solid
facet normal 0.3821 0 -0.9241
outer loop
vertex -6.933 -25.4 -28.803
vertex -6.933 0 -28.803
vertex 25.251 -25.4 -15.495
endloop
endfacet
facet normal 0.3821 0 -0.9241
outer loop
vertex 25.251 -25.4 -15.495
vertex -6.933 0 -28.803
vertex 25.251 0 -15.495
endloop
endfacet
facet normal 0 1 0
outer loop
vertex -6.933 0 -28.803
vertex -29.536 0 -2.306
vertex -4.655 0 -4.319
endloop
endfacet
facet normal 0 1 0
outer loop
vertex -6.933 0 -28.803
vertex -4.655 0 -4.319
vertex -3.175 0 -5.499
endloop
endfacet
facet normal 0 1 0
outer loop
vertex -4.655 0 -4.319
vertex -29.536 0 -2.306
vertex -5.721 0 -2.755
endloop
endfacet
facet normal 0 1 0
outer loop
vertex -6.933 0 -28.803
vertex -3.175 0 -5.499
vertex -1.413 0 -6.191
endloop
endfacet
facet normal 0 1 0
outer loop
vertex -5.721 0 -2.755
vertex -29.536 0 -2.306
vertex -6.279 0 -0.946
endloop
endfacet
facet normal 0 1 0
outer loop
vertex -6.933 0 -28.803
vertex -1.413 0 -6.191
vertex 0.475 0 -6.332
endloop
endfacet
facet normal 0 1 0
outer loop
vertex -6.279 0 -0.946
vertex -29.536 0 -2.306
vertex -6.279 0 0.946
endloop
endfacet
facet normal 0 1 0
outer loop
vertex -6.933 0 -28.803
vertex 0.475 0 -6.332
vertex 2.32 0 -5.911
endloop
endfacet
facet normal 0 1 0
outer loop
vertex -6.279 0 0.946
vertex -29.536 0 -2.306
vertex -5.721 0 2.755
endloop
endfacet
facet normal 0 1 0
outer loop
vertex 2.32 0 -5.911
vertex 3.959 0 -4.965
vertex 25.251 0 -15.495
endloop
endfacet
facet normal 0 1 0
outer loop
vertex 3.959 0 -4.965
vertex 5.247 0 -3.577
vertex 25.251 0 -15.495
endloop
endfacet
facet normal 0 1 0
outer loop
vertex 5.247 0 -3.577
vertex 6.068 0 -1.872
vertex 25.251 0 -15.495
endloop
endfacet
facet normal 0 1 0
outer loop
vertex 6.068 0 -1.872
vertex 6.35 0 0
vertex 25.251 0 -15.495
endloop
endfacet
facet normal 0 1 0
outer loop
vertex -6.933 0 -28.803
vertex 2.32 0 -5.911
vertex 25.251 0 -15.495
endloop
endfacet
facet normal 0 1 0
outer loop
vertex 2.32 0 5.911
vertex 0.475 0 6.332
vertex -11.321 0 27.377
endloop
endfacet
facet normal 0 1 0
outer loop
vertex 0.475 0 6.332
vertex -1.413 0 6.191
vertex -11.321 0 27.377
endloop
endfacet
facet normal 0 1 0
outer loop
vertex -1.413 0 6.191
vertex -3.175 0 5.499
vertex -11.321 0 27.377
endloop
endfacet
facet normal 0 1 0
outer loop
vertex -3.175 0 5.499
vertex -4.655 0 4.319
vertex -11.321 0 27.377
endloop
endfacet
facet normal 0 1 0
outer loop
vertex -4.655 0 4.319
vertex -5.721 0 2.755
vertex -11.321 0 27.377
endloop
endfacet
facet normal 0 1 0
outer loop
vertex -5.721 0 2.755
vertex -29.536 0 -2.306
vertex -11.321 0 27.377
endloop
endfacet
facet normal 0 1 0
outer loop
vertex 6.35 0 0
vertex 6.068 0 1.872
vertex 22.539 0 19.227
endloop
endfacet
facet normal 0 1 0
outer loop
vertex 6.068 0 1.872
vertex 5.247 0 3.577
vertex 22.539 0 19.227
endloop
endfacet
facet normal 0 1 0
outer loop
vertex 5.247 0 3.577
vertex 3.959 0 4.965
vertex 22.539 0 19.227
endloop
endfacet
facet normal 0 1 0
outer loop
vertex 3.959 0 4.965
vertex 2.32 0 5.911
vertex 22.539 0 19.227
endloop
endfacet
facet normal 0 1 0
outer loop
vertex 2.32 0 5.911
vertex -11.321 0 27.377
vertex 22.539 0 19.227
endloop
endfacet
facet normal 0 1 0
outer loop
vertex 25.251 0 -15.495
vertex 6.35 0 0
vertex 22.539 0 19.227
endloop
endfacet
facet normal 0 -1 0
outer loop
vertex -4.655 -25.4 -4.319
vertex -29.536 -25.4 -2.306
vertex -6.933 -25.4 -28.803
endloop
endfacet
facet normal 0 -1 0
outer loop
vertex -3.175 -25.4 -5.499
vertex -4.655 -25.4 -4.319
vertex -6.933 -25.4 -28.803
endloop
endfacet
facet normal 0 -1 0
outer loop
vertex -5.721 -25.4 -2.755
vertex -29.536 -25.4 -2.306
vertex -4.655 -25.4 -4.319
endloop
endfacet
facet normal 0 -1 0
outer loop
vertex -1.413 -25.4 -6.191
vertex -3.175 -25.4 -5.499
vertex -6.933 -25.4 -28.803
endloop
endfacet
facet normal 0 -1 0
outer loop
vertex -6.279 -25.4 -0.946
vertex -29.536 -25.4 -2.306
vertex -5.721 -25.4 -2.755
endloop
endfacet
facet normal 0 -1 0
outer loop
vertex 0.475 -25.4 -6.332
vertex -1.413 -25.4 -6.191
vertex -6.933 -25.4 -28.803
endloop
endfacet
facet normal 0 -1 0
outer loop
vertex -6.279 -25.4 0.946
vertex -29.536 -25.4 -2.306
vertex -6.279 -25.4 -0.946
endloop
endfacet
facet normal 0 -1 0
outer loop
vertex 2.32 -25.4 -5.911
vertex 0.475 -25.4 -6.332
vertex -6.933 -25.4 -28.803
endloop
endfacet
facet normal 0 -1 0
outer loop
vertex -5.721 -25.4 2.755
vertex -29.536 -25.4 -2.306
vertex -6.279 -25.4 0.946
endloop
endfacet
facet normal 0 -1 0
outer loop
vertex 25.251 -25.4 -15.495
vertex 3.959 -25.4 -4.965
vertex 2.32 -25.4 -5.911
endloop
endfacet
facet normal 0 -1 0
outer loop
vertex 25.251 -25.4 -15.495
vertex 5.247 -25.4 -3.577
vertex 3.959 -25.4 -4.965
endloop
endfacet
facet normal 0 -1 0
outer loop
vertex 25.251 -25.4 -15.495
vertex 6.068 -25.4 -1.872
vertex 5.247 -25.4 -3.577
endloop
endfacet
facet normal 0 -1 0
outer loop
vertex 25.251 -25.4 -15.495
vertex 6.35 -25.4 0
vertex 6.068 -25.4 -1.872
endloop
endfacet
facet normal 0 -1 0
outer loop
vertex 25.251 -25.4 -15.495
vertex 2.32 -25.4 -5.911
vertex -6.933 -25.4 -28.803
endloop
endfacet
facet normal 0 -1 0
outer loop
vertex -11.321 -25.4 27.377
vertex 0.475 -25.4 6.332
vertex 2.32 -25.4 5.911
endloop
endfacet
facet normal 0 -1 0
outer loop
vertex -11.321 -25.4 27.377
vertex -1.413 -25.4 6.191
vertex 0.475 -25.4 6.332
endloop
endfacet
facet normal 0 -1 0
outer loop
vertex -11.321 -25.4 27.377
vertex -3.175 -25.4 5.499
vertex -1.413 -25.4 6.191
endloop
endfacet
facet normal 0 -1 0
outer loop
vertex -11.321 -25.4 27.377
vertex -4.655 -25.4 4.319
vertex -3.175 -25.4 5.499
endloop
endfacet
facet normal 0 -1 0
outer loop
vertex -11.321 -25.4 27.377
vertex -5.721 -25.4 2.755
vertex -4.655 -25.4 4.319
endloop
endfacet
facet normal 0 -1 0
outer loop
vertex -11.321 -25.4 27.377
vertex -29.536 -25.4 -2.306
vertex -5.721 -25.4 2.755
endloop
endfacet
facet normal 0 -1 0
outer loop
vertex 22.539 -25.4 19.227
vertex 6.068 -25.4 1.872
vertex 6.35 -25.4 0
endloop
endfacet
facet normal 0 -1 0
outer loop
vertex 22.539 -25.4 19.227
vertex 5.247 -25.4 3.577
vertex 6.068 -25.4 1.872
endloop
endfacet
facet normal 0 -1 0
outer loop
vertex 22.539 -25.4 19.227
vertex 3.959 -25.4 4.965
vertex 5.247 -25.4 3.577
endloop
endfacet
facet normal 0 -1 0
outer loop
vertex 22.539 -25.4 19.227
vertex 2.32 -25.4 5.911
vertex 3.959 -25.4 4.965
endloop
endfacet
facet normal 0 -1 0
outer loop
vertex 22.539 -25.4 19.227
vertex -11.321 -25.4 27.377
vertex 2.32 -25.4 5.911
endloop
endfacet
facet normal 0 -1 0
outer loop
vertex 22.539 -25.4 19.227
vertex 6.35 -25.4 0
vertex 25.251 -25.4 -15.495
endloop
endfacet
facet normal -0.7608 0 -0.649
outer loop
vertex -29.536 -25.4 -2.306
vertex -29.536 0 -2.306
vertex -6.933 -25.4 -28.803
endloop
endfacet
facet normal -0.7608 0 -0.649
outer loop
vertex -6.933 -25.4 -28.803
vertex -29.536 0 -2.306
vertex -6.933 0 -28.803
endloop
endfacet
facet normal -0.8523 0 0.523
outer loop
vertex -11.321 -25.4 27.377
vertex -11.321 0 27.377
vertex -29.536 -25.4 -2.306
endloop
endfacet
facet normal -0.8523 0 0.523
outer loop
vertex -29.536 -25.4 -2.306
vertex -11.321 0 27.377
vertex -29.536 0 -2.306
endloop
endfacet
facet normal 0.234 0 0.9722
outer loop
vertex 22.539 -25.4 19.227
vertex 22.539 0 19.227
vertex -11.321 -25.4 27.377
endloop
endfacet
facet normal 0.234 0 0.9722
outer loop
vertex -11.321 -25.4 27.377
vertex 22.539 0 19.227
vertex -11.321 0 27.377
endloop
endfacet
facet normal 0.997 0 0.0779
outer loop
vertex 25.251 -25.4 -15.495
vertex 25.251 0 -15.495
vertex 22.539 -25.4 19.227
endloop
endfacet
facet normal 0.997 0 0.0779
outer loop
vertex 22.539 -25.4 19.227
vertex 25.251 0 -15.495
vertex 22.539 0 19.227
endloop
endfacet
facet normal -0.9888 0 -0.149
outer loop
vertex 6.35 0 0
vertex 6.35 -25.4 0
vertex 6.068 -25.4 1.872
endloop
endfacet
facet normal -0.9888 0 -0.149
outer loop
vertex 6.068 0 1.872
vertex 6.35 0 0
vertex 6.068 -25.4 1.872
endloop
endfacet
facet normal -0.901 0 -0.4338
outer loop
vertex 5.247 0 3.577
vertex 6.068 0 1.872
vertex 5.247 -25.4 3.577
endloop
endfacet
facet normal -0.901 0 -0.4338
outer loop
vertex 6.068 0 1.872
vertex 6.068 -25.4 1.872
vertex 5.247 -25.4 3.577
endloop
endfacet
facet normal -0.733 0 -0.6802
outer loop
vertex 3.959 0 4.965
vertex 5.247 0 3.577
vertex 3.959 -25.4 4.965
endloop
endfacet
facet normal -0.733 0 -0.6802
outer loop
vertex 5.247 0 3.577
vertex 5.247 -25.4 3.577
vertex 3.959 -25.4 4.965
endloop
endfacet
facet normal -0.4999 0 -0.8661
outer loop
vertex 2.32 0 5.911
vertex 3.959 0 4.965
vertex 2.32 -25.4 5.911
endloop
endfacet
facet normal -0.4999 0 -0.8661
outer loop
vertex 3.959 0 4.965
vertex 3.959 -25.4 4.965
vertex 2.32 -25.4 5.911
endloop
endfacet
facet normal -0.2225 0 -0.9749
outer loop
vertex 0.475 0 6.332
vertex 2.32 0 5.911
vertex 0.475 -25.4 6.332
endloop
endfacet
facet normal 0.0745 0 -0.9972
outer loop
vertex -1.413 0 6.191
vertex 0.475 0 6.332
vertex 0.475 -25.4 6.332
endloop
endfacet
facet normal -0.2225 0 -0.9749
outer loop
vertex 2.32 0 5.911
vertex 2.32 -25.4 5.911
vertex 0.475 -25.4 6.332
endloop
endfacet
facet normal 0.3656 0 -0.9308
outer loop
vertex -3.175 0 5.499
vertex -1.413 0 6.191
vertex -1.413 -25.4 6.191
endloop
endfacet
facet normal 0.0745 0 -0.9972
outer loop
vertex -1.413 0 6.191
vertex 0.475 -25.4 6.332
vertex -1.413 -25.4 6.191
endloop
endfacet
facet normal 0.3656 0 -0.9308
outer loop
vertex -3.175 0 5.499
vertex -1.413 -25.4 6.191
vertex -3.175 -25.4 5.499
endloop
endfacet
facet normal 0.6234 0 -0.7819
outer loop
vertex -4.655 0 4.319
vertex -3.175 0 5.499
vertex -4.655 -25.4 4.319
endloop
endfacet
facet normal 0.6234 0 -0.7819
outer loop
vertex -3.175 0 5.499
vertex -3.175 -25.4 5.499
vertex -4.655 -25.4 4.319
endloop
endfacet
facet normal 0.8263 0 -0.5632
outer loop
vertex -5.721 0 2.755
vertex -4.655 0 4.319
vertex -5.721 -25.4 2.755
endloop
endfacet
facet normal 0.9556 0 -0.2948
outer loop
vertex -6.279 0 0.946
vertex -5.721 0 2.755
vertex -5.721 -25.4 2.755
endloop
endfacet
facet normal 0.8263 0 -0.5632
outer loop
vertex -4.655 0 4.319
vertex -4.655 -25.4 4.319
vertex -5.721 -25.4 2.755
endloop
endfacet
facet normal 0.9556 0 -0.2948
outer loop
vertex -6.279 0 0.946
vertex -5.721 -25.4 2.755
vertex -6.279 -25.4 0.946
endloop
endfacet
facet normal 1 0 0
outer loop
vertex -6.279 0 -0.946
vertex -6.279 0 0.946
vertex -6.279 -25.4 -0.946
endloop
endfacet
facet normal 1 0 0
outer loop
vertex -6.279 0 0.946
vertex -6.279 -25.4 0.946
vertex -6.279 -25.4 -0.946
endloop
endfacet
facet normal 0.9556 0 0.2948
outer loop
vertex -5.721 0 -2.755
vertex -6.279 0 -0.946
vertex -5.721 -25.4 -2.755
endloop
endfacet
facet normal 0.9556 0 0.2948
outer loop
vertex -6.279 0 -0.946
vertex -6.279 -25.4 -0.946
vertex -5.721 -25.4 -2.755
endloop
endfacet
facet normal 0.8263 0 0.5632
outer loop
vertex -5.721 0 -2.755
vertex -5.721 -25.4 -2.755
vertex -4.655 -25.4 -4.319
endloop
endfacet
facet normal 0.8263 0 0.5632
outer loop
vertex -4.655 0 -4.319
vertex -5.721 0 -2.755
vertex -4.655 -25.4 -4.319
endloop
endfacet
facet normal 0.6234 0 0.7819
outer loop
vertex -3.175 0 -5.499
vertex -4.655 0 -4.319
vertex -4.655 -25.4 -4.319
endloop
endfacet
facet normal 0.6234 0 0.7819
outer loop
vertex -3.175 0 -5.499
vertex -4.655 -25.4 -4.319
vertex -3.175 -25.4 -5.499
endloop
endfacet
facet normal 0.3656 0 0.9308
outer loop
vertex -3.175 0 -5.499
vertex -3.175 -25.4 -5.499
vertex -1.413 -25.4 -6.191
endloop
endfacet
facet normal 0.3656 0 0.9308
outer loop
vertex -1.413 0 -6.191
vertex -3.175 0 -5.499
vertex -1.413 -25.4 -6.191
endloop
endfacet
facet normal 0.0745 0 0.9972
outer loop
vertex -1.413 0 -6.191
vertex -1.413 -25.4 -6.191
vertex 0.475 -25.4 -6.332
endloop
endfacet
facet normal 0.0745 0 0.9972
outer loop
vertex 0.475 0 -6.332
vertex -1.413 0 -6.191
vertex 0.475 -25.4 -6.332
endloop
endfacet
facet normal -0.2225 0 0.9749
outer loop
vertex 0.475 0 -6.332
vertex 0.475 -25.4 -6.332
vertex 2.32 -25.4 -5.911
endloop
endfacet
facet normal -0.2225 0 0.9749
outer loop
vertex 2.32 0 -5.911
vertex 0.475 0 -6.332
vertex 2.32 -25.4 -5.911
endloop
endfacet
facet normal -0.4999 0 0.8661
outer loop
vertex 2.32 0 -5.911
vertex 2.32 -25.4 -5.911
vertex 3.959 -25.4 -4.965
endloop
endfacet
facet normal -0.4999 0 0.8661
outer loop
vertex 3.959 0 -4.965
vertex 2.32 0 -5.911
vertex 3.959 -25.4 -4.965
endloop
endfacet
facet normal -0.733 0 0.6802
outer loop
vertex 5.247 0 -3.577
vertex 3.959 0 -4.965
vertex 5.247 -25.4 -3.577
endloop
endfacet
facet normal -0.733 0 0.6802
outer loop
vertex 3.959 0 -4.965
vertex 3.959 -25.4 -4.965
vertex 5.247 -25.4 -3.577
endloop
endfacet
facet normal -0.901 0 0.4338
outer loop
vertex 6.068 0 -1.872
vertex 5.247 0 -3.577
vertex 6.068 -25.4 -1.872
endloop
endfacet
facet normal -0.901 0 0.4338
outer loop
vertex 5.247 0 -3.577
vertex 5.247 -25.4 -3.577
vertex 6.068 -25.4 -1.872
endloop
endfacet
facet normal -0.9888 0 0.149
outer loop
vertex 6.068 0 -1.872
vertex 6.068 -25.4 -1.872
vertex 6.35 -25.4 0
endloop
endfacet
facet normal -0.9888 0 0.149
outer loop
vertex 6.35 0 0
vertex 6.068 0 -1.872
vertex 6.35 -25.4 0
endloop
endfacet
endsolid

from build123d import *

# Parameters (mm, degrees)
F1_DEPTH = 25.4
F2_R     = 6.35
F3_DEPTH = 25.4


with BuildPart() as f1:
    # F0 (on Front) → F1 (new body)
    with BuildSketch(Plane.XZ):
        Polygon((-11.320572, 27.37729), (-29.535599, -2.306457), (-6.933432, -28.802758), (25.250503, -15.494627), (22.5391, 19.226552), align=None)
    extrude(amount=F1_DEPTH)

    # F2 (on face) → F3 (cut)
    with BuildSketch(Plane.XZ.offset(25.4)):
        Circle(F2_R)
    extrude(amount=-F3_DEPTH, mode=Mode.SUBTRACT)


solid = f1.part
